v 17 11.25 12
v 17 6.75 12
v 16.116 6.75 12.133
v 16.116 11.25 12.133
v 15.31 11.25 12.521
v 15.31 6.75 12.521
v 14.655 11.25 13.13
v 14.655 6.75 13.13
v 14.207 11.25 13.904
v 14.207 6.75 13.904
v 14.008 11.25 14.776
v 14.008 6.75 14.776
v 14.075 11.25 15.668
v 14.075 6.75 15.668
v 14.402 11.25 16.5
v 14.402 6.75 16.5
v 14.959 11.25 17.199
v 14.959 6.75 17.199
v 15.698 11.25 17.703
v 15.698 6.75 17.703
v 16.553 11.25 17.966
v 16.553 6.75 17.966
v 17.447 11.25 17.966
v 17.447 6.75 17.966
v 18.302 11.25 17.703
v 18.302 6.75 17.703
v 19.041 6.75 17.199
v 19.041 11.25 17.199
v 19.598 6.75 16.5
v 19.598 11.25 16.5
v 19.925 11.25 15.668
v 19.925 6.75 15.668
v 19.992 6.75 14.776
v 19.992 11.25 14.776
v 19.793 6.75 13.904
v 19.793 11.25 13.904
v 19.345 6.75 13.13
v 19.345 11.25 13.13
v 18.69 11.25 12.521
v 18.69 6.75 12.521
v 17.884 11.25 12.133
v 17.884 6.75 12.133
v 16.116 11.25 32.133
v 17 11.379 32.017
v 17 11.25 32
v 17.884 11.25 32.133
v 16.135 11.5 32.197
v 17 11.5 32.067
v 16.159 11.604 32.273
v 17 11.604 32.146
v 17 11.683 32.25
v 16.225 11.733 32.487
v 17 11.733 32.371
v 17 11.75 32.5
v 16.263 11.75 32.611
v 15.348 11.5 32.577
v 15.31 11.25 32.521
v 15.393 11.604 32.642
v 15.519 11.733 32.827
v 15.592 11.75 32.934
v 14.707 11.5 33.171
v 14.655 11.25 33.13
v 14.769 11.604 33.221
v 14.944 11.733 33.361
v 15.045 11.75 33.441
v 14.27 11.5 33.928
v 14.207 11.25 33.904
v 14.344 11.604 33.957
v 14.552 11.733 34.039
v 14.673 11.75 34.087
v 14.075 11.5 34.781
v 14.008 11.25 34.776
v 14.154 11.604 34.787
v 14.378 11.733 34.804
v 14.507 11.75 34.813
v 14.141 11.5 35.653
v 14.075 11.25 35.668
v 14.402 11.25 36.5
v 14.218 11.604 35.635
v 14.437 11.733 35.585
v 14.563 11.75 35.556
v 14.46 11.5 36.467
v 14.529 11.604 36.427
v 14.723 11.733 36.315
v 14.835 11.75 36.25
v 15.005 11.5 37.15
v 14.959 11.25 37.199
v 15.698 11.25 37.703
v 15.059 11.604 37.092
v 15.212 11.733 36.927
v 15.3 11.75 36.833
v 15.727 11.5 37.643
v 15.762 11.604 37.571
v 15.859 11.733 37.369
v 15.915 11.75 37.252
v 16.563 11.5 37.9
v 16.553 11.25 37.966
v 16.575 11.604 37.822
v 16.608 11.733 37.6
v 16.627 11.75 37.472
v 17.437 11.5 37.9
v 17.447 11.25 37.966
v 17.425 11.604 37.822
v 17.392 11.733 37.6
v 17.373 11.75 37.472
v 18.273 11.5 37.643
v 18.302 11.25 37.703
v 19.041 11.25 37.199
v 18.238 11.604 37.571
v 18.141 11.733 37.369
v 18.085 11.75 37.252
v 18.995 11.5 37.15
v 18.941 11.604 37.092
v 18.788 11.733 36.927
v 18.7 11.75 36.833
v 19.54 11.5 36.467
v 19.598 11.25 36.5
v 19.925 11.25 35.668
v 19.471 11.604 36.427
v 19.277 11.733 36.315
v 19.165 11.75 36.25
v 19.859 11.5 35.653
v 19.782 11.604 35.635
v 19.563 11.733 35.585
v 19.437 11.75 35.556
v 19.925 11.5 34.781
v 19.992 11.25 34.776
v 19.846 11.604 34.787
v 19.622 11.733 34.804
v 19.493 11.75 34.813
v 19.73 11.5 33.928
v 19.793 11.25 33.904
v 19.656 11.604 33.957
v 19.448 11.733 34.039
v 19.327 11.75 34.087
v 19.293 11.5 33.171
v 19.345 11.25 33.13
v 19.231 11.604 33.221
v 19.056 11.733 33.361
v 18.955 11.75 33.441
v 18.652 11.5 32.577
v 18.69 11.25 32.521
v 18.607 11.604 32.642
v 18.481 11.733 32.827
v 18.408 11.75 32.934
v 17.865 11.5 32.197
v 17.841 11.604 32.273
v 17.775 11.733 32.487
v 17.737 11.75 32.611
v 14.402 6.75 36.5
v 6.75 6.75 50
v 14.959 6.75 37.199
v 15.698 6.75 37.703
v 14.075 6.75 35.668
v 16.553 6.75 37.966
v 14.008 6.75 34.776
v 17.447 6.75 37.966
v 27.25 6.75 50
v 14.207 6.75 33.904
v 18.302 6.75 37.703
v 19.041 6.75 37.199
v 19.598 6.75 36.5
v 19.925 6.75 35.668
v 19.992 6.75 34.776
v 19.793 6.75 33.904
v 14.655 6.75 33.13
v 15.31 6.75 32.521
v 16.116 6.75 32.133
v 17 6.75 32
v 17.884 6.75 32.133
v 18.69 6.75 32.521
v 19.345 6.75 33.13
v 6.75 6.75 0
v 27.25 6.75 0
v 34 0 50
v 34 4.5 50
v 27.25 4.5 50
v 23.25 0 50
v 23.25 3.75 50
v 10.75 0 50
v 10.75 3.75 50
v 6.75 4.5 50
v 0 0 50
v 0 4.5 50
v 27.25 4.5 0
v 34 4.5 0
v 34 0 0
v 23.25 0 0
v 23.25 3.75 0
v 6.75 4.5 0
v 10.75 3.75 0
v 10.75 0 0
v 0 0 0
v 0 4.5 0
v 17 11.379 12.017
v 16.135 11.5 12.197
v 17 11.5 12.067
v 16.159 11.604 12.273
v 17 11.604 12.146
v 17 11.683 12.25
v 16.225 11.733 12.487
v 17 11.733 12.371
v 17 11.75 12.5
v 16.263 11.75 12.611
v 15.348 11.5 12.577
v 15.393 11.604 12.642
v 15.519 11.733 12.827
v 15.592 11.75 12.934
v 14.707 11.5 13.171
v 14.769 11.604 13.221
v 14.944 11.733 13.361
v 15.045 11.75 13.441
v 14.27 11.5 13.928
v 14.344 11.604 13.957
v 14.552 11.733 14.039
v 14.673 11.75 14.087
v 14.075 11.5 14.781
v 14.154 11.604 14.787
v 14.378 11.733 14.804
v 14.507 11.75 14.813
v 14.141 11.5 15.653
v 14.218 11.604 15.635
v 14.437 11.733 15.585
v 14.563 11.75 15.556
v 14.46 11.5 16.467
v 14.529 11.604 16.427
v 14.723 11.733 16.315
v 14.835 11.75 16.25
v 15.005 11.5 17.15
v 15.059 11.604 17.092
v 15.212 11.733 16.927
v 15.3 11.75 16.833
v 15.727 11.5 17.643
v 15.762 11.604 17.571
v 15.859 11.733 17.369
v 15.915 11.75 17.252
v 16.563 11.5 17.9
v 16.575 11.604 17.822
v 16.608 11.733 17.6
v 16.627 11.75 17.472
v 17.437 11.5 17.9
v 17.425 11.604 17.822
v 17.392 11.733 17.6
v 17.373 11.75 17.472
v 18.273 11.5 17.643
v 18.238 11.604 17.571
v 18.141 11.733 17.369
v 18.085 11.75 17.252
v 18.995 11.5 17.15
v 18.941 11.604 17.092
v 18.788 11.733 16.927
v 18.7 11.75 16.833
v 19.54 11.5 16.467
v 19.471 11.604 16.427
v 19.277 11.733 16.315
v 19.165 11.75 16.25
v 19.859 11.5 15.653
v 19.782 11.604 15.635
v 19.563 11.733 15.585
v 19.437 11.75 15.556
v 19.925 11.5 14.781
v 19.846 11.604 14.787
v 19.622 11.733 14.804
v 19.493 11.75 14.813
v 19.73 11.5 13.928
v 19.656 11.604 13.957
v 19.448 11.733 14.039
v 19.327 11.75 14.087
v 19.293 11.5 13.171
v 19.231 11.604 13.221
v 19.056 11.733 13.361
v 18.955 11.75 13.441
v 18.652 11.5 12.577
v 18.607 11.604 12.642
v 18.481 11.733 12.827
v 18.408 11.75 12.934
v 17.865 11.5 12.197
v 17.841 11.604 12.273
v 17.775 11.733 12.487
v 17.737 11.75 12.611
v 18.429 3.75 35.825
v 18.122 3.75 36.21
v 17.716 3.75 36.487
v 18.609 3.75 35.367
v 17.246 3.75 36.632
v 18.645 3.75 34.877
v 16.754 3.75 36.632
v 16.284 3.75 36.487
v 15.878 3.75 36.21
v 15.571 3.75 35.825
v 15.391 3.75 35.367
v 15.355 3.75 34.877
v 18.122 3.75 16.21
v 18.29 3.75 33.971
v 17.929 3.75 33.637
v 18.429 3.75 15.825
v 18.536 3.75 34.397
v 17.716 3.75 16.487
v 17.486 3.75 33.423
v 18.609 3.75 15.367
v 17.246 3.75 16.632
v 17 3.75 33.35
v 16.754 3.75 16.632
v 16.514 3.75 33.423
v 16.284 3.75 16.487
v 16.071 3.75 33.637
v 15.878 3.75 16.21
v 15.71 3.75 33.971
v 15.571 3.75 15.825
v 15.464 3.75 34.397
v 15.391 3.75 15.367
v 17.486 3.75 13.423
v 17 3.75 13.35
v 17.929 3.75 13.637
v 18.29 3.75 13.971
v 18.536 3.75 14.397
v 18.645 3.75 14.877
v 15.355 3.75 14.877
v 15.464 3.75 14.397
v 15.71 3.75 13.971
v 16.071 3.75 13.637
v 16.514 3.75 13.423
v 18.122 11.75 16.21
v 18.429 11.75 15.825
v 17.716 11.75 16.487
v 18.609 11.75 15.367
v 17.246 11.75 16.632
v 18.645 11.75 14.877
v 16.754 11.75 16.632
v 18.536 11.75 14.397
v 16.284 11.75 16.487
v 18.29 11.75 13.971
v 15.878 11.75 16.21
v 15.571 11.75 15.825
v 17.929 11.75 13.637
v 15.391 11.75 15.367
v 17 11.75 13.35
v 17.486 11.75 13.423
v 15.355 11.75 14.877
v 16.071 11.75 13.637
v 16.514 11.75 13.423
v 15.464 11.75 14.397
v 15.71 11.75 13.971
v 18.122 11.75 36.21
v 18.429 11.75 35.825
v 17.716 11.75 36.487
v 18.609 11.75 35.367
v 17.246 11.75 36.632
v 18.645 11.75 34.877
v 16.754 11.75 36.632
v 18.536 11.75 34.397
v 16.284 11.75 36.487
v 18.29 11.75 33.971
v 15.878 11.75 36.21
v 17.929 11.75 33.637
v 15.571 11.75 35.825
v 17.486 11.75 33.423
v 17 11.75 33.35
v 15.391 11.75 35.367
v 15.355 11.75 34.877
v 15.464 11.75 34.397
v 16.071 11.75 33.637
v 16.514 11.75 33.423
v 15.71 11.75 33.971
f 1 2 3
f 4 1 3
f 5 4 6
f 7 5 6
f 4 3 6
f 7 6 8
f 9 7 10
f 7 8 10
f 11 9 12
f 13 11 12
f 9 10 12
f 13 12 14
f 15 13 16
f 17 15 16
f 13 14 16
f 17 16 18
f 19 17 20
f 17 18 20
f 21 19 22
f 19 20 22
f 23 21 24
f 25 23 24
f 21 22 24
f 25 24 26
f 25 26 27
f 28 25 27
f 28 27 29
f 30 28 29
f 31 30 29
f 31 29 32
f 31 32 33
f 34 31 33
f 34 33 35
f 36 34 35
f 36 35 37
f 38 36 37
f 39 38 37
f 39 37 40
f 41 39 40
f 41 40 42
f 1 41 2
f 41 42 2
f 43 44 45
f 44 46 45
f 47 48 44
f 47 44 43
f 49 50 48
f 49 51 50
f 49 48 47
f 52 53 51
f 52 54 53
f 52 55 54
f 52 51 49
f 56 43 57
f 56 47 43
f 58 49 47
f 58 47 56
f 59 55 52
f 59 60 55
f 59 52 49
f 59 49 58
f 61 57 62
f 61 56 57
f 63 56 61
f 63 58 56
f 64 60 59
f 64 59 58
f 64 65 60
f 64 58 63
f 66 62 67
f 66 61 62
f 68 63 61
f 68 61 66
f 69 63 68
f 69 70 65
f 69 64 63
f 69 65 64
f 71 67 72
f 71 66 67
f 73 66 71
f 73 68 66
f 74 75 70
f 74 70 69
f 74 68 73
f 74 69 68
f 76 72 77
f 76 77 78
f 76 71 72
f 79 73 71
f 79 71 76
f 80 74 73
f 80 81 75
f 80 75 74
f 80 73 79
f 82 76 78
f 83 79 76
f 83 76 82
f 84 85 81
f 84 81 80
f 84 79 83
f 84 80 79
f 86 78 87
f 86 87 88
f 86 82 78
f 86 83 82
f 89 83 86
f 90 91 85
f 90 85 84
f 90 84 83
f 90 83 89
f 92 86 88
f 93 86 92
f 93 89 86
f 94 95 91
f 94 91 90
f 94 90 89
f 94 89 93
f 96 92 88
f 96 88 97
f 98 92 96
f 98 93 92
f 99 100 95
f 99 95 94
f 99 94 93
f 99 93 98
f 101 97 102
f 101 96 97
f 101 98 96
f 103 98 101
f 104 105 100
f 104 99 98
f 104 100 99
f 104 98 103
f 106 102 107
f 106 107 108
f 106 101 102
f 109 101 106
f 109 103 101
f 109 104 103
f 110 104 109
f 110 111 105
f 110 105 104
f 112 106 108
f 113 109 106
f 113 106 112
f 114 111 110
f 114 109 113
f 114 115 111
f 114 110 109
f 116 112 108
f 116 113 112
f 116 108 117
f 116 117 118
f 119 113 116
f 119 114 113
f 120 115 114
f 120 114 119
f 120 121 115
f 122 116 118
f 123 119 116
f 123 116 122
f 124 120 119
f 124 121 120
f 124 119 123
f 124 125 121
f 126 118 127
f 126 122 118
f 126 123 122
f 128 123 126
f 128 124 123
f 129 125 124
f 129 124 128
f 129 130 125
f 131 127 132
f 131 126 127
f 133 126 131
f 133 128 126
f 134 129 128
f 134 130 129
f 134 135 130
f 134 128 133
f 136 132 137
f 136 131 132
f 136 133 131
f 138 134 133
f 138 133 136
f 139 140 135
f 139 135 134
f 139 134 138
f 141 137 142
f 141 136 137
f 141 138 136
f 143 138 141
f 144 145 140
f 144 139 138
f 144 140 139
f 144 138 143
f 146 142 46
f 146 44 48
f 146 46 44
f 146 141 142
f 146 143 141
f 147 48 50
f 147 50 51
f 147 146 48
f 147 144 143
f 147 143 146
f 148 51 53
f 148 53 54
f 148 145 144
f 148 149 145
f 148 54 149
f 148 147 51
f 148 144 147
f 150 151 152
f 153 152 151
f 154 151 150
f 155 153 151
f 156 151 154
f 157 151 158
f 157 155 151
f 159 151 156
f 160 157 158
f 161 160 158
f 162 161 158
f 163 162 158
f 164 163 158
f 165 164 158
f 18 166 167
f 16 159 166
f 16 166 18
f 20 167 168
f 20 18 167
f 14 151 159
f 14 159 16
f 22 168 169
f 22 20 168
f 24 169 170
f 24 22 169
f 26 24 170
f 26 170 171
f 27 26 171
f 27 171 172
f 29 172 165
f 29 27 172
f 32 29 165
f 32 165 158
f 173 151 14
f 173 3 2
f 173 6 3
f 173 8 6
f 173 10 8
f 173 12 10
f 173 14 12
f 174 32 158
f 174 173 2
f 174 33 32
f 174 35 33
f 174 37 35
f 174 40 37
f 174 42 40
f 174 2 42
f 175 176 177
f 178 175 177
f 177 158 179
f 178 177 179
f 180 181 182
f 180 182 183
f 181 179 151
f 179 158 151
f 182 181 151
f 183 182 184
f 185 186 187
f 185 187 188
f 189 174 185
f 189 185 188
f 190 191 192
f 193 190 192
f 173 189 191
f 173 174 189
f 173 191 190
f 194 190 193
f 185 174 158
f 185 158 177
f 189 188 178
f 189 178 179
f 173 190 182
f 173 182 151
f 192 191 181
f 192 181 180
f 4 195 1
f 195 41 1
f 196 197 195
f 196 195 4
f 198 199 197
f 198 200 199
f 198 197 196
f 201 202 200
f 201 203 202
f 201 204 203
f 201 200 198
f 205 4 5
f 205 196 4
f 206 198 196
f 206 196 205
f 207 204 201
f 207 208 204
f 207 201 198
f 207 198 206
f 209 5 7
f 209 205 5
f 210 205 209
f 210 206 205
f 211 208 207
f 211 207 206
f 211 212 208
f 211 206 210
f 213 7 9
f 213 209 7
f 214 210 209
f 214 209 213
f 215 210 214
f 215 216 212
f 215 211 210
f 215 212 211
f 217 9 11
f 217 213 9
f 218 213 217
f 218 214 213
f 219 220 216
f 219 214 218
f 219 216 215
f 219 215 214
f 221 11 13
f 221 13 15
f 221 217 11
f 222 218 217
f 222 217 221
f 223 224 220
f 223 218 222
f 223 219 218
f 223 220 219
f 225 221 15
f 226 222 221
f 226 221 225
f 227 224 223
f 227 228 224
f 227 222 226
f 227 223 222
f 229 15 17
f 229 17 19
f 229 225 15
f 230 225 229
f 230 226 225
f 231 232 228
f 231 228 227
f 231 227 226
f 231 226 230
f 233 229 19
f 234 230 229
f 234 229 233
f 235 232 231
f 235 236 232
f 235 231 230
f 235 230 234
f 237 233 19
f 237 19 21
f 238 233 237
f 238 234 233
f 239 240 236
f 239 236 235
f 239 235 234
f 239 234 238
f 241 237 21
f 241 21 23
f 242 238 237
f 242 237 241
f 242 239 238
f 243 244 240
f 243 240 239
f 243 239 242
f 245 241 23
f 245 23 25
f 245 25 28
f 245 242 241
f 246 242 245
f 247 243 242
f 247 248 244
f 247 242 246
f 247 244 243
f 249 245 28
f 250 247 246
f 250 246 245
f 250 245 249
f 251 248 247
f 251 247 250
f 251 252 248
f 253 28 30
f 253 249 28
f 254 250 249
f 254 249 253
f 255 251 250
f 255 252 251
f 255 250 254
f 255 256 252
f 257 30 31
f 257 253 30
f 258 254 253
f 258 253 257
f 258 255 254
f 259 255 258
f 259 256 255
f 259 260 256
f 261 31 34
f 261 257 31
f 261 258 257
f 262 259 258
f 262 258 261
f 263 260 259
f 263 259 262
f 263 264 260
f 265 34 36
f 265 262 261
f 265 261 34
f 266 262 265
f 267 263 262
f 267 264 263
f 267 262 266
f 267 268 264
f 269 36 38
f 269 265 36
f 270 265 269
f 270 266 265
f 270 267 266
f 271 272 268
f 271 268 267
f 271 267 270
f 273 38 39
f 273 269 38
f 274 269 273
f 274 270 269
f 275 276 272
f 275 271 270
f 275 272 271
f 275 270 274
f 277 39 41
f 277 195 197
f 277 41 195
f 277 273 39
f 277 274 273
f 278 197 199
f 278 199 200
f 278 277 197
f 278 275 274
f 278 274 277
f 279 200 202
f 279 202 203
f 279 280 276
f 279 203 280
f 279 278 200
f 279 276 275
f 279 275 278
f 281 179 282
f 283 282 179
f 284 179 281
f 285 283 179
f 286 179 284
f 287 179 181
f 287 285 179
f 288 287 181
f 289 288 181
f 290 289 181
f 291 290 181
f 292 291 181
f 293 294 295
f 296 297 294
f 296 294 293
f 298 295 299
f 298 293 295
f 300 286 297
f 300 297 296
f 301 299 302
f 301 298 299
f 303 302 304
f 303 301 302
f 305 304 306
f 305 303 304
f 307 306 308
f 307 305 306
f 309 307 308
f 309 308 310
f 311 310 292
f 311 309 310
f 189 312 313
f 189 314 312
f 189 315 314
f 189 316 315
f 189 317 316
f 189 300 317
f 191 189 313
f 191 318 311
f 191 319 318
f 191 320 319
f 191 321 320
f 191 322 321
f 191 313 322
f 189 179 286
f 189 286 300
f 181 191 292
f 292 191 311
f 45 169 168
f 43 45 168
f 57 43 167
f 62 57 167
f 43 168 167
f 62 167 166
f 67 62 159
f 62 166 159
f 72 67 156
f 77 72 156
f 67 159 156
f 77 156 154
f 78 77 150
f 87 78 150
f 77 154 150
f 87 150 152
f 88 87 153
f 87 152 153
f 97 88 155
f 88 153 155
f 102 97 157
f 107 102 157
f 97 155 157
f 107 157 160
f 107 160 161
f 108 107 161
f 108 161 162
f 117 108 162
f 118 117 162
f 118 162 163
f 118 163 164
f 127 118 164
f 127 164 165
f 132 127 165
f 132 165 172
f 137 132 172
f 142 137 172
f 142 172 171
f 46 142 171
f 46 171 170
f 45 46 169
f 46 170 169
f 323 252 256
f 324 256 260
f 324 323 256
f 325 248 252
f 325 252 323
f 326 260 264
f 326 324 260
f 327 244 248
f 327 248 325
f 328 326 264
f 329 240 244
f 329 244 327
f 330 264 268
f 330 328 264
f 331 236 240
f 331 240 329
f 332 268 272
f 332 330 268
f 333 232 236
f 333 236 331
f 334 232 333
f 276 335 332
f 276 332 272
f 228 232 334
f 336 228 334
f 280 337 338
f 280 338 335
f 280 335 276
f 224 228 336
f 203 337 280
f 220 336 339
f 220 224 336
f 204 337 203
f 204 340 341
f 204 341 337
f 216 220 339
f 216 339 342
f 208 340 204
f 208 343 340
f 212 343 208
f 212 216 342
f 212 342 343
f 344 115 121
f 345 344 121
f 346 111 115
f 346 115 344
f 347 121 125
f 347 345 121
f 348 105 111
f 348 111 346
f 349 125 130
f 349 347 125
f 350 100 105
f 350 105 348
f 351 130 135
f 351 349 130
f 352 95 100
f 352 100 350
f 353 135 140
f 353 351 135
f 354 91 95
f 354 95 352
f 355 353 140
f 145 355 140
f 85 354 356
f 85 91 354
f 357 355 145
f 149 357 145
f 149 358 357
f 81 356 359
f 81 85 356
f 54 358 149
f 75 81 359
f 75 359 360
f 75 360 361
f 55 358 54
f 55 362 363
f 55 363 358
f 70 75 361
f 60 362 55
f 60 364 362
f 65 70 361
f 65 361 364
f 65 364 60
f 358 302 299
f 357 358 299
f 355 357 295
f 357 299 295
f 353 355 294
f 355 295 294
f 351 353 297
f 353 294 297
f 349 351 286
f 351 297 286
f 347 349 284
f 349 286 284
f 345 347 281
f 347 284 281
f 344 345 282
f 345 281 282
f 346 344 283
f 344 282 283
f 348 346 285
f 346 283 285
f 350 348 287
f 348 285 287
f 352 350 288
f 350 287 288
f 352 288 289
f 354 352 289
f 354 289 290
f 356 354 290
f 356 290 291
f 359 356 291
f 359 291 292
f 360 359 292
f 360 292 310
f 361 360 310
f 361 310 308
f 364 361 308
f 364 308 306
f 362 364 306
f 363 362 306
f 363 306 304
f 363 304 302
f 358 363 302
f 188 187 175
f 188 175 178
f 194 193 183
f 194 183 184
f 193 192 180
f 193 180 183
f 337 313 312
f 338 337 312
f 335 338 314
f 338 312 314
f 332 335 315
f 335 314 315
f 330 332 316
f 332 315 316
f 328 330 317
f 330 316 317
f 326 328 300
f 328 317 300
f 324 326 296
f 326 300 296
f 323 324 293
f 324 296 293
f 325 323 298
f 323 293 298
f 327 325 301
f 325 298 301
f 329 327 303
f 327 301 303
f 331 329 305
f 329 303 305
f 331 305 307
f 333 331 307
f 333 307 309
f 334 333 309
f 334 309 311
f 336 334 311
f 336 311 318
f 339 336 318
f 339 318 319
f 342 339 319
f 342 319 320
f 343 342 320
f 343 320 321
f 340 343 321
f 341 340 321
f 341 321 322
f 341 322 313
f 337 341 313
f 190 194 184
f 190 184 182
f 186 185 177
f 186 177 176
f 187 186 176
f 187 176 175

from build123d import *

# Parameters (mm, degrees)
BOSS_EXTRUDE1_DEPTH   = 50
SKETCH4_R             = 3
BOSS_EXTRUDE2_DEPTH   = 5
M4X0_7_TAPPED_HOLE1_D = 3.3
FILLET1_R             = 0.5


with BuildPart() as part:
    # Sketch1 → Boss-Extrude1 (new body)
    with BuildSketch(Plane.XY):
        Polygon((0, 0), (0, 4.5), (6.75, 4.5), (6.75, 6.75), (27.25, 6.75), (27.25, 4.5), (34, 4.5), (34, 0), (23.25, 0), (23.25, 3.75), (10.75, 3.75), (10.75, 0), align=None)
    extrude(amount=BOSS_EXTRUDE1_DEPTH)

    # Sketch4 → Boss-Extrude2 (add)
    with BuildSketch(Plane(origin=(0, 6.75, 0), x_dir=(1, 0, 0), z_dir=(0, 1, 0))):
        with Locations(Location((17, -15, 0), (0, 0, 90))):
            Circle(SKETCH4_R)
        with Locations(Location((17, -35, 0), (0, 0, 90))):
            Circle(SKETCH4_R)
    extrude(amount=BOSS_EXTRUDE2_DEPTH)

    # M4x0.7 Tapped Hole1 (through all)
    with Locations(Plane(origin=(17, 11.75, 15), x_dir=(0, 0, 1), z_dir=(0, 1, 0))):
        with Locations((0, 0), (20, 0)):
            Hole(M4X0_7_TAPPED_HOLE1_D / 2)

    # Fillet1
    fillet1_edges = [part.edges().sort_by_distance(p)[0] for p in [
        (17, 11.75, 18),
        (17, 11.75, 38),
    ]]
    fillet(fillet1_edges, radius=FILLET1_R)


solid = part.part
